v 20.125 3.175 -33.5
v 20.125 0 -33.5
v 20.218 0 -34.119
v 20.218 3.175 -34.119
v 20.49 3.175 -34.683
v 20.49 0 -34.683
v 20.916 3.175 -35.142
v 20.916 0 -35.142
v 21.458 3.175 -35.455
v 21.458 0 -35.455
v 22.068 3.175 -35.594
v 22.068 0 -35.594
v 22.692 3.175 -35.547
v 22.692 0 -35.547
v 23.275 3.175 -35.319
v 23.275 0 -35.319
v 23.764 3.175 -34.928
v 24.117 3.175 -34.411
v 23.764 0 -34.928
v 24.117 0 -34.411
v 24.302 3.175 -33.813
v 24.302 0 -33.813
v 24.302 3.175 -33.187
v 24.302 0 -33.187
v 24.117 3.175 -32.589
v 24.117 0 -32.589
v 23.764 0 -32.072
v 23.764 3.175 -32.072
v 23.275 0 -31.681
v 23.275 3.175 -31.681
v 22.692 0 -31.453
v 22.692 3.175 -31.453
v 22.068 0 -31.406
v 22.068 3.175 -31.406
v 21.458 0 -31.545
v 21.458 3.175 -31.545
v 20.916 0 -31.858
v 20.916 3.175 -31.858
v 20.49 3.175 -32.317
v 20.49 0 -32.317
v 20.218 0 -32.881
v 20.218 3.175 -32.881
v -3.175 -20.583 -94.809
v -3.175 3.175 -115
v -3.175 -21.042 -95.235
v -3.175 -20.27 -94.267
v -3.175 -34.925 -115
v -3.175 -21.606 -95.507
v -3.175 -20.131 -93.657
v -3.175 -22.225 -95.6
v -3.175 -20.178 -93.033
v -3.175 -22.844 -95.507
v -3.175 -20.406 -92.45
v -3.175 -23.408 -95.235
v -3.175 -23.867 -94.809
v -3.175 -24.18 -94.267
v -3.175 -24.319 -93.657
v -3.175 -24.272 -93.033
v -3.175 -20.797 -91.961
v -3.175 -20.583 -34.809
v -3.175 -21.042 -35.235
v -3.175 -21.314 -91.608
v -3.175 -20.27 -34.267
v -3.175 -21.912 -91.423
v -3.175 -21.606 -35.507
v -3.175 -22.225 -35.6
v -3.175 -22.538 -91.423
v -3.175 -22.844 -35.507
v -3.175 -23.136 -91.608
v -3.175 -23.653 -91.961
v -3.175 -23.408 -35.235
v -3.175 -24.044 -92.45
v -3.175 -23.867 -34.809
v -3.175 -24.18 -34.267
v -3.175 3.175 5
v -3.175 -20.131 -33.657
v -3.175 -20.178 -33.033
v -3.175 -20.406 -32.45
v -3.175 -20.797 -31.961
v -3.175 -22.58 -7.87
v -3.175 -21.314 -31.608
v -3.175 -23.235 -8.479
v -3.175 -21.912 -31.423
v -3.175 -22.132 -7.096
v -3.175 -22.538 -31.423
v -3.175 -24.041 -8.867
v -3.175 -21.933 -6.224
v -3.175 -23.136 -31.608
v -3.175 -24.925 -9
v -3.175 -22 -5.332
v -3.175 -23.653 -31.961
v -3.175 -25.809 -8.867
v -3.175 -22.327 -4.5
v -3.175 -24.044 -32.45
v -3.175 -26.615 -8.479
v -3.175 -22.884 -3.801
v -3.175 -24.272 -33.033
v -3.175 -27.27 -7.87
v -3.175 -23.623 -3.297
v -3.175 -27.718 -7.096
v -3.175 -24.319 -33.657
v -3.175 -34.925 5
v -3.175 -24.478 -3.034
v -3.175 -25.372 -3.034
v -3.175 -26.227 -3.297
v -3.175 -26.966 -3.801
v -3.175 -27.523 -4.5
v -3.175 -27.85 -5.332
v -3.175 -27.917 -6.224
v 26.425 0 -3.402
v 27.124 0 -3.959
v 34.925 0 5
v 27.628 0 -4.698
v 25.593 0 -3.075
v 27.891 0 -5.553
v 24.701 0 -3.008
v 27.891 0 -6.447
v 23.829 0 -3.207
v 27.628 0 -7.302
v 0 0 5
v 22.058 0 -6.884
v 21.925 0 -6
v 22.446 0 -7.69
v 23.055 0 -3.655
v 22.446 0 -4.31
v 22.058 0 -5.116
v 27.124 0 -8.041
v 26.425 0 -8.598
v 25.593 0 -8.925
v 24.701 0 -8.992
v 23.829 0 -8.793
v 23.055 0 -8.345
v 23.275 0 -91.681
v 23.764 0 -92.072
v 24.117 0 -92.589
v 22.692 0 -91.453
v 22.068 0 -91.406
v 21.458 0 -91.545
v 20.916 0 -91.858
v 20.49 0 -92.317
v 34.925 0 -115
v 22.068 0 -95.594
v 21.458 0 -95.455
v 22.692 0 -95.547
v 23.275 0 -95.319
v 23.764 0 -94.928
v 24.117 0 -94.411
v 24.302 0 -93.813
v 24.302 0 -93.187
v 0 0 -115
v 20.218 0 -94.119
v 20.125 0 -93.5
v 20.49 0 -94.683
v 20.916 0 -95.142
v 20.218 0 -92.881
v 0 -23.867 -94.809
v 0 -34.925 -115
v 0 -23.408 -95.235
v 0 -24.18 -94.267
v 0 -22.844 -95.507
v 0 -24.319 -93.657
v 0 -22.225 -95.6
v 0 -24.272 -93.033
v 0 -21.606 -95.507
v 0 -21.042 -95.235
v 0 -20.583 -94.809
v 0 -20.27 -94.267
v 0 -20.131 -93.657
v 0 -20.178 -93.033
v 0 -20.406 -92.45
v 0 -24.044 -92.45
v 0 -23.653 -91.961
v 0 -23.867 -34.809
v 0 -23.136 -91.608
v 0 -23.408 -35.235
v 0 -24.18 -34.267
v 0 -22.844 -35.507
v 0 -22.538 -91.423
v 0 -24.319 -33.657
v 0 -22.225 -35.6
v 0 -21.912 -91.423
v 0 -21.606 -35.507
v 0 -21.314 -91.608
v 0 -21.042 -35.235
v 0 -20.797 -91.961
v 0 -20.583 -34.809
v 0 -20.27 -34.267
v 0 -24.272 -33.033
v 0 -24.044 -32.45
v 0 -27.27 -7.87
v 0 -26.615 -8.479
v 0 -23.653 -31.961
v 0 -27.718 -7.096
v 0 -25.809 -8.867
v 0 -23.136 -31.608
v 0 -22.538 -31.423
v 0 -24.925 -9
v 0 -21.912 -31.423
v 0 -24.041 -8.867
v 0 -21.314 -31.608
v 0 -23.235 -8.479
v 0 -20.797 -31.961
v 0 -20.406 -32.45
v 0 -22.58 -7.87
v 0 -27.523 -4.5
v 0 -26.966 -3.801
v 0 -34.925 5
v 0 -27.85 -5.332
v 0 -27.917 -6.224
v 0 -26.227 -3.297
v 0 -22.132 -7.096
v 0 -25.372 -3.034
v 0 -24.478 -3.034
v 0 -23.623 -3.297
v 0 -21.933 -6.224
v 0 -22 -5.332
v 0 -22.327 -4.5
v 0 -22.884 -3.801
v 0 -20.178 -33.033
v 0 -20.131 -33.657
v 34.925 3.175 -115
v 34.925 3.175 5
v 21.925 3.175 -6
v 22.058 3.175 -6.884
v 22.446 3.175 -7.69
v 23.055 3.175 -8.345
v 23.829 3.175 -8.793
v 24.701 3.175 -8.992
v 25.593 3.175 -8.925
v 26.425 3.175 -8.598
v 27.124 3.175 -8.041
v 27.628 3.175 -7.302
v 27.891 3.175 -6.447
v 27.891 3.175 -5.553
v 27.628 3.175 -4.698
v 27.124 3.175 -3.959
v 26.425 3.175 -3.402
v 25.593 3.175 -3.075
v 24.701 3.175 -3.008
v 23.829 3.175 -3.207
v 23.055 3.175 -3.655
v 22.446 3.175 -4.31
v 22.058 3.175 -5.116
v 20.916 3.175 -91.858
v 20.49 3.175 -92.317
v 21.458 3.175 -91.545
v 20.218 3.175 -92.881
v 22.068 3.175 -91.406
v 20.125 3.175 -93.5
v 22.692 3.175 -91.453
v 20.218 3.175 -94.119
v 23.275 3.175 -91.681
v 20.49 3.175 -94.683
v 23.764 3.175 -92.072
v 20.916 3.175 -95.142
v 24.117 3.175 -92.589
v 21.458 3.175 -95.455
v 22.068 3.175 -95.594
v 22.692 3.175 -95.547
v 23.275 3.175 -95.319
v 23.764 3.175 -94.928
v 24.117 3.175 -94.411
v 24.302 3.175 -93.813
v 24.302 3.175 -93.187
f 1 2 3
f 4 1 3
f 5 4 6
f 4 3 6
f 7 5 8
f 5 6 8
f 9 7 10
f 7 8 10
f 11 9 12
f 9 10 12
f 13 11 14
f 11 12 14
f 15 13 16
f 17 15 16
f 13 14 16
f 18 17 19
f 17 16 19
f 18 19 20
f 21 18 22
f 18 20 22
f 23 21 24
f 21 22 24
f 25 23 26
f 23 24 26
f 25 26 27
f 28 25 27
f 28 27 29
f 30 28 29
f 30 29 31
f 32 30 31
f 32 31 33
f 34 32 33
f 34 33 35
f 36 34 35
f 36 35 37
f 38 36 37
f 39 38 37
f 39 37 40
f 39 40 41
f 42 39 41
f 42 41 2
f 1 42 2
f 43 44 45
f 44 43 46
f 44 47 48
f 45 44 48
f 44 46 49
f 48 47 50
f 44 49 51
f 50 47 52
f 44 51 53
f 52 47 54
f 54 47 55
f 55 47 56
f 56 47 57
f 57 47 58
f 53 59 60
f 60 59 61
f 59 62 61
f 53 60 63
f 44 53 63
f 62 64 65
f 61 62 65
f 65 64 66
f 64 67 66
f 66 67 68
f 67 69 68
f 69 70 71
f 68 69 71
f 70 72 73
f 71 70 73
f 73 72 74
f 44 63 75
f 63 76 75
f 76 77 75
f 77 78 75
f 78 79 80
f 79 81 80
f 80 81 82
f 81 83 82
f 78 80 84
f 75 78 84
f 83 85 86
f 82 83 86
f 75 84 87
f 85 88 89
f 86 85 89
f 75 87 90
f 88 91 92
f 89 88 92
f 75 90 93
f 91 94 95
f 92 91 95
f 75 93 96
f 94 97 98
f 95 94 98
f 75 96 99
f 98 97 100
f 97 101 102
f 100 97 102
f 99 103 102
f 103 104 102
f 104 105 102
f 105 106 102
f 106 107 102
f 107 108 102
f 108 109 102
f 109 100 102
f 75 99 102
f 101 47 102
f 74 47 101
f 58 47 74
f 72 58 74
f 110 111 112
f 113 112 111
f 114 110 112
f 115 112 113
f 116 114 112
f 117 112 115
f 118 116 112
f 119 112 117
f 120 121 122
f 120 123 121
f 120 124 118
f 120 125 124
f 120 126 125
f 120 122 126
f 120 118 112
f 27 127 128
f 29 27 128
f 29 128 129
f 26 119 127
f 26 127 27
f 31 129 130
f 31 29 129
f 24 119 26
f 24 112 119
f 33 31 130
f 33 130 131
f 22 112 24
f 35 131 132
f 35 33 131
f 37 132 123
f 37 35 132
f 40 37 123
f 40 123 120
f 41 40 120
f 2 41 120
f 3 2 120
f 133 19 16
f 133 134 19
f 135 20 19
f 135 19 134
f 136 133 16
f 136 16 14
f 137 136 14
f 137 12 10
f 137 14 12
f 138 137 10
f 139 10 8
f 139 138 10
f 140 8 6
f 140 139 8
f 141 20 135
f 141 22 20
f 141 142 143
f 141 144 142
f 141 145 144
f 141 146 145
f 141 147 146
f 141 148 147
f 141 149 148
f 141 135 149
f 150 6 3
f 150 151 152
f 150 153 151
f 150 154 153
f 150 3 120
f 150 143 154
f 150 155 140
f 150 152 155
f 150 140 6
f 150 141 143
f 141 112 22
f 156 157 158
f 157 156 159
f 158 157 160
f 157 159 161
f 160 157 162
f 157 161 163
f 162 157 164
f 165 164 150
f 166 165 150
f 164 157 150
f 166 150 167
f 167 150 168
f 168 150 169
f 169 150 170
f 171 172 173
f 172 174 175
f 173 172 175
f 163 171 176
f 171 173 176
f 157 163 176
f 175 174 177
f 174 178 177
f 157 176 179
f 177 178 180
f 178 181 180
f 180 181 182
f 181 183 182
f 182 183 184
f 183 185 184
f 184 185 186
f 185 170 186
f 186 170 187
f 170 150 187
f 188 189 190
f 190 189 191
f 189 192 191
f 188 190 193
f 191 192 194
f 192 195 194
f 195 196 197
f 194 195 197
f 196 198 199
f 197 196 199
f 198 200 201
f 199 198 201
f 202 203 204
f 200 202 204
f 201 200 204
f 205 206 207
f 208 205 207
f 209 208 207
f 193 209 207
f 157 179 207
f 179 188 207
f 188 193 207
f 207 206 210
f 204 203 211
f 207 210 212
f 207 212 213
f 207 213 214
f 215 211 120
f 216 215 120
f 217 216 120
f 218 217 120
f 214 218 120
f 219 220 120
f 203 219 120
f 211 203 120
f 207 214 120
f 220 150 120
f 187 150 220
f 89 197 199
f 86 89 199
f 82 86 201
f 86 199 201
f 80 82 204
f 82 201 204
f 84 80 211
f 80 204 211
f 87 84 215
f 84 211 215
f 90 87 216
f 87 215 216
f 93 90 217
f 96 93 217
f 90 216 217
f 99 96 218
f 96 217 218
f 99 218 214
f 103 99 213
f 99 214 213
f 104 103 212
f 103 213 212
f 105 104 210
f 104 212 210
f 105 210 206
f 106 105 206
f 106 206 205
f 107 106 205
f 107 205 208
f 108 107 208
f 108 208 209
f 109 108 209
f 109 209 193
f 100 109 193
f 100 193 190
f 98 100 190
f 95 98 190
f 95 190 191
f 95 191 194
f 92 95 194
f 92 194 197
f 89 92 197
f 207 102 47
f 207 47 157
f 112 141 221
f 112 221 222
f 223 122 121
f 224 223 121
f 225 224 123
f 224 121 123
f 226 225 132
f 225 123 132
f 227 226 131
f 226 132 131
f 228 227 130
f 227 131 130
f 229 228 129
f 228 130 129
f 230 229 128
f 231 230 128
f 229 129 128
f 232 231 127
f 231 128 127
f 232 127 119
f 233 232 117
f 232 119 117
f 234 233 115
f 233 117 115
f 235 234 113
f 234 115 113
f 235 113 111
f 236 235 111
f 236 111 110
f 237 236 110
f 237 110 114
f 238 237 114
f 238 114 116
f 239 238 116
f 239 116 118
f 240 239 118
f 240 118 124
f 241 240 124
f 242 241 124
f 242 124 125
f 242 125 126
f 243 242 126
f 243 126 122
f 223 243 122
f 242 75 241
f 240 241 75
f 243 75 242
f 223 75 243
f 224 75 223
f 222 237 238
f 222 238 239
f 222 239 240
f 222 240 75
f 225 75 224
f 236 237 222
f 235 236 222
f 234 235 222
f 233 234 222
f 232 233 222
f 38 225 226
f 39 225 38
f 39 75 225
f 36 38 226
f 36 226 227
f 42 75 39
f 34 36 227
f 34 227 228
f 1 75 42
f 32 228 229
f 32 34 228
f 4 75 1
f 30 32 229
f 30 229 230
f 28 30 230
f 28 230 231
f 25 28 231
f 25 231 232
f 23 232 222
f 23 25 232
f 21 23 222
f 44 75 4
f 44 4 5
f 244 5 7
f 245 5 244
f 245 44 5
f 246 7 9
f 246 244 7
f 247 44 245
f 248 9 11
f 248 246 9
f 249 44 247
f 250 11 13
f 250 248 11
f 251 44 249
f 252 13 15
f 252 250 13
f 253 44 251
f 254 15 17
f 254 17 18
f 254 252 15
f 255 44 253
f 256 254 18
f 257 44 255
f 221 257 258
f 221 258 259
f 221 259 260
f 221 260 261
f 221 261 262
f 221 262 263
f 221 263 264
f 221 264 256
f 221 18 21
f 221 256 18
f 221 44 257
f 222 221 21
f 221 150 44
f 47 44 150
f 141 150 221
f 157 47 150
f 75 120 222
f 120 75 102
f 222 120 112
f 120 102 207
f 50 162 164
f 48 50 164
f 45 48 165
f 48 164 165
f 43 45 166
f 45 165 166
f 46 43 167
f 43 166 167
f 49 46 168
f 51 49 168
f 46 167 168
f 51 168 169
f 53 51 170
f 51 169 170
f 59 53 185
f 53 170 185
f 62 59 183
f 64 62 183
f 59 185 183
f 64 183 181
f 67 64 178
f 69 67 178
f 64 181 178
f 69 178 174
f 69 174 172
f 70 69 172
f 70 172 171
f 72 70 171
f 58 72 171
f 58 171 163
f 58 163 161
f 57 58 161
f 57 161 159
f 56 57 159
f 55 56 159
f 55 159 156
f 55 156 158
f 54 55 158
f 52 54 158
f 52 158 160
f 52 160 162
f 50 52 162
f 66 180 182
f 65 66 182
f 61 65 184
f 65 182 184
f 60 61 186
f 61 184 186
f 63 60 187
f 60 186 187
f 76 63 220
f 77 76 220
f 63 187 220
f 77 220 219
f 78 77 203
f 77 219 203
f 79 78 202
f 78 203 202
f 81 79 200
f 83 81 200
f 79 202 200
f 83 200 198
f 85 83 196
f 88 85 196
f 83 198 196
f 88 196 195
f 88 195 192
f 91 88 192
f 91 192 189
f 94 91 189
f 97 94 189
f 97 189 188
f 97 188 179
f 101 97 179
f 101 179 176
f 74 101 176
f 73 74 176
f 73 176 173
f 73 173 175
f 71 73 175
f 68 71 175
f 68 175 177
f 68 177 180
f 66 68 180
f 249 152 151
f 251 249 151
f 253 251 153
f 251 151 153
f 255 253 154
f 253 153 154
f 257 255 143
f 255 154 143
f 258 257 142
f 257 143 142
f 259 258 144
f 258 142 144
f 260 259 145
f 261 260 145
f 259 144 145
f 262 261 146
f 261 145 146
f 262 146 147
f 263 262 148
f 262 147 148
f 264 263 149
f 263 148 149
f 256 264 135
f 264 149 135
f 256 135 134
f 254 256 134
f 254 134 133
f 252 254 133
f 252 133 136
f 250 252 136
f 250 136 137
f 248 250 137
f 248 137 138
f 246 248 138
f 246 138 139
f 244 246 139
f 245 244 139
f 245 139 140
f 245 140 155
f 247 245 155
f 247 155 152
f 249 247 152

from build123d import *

# Parameters (mm, degrees)
SKETCH1_W                      = 38.1
SKETCH1_H                      = 120
BOSS_EXTRUDE1_DEPTH            = 38.1
SKETCH2_W                      = 34.925
SKETCH2_H                      = 34.925
CUT_EXTRUDE1_DEPTH             = 130.767142413
F_4_2_4_2_DIAMETER_HOLE1_D     = 4.2
F_6_0_6_DIAMETER_HOLE1_D       = 6
F_4_2_4_2_DIAMETER_HOLE2_D     = 4.2
F_4_2_4_2_DIAMETER_HOLE2_DEPTH = 38.1
F_6_0_6_DIAMETER_HOLE2_D       = 6
F_6_0_6_DIAMETER_HOLE2_DEPTH   = 38.1
F_6_0_6_DIAMETER_HOLE3_D       = 6
F_6_0_6_DIAMETER_HOLE3_DEPTH   = 38.1
F_4_2_4_2_DIAMETER_HOLE3_D     = 4.2
SKETCH15_R                     = 2.1
SKETCH15_R_2                   = 3
BOSS_EXTRUDE2_DEPTH            = 3.175
BOSS_EXTRUDE3_START            = -3.175
SKETCH16_R                     = 3
SKETCH16_R_2                   = 2.1
BOSS_EXTRUDE3_DEPTH            = 3.175


with BuildPart() as part:
    # Sketch1 → Boss-Extrude1 (new body)
    with BuildSketch(Plane.XZ.offset(34.925)):
        with Locations((15.875, -55)):
            Rectangle(SKETCH1_W, SKETCH1_H)
    extrude(amount=-BOSS_EXTRUDE1_DEPTH)

    # Sketch2 → Cut-Extrude1 (cut, through all)
    with BuildSketch(Plane(origin=(0, 0, -115), x_dir=(-1, 0, 0), z_dir=(0, 0, -1))):
        with Locations((-17.4625, -17.4625)):
            Rectangle(SKETCH2_W, SKETCH2_H)
    extrude(amount=-CUT_EXTRUDE1_DEPTH, mode=Mode.SUBTRACT)

    # Ø4.2 (4.2) Diameter Hole1 (through all)
    with Locations(Plane(origin=(0, 0, 0), x_dir=(-1, 0, 0), z_dir=(0, -1, 0))):
        with Locations((-5, 35.97), (-5, 91.03)):
            Hole(F_4_2_4_2_DIAMETER_HOLE1_D / 2)

    # Ø6.0 (6) Diameter Hole1 (through all)
    with Locations(Plane(origin=(0, 0, 0), x_dir=(-1, 0, 0), z_dir=(0, -1, 0))):
        with Locations((-22.225, 106.5), (-22.225, 46.5)):
            Hole(F_6_0_6_DIAMETER_HOLE1_D / 2)

    # Ø4.2 (4.2) Diameter Hole2
    with Locations(Plane(origin=(0, 3.175, 0), x_dir=(1, 0, 0), z_dir=(0, 1, 0))):
        with Locations((22.225, 33.5), (22.225, 93.5), (29.296067812, 100.571067812), (29.296067812, 26.428932188)):
            Hole(F_4_2_4_2_DIAMETER_HOLE2_D / 2, depth=F_4_2_4_2_DIAMETER_HOLE2_DEPTH)

    # Ø6.0 (6) Diameter Hole2
    with Locations(Plane(origin=(0, 3.175, 0), x_dir=(1, 0, 0), z_dir=(0, 1, 0))):
        with Locations((24.925, 6)):
            Hole(F_6_0_6_DIAMETER_HOLE2_D / 2, depth=F_6_0_6_DIAMETER_HOLE2_DEPTH)

    # Ø6.0 (6) Diameter Hole3
    with Locations(Plane.ZY.offset(3.175)):
        with Locations((-6, -24.925), (-106.5, -22.225), (-46.5, -22.225)):
            Hole(F_6_0_6_DIAMETER_HOLE3_D / 2, depth=F_6_0_6_DIAMETER_HOLE3_DEPTH)

    # Ø4.2 (4.2) Diameter Hole3 (through all)
    with Locations(Plane.ZY.offset(3.175)):
        with Locations((-93.5, -22.225), (-33.5, -22.225), (-35.97, -5), (-91.03, -5), (-100.571067812, -29.296067812), (-26.428932188, -29.296067812)):
            Hole(F_4_2_4_2_DIAMETER_HOLE3_D / 2)

    # Sketch15 → Boss-Extrude2 (add)
    with BuildSketch(Plane(origin=(0, 3.175, 0), x_dir=(1, 0, 0), z_dir=(0, 1, 0))):
        with Locations((29.296067812, 26.428932188)):
            Circle(SKETCH15_R)
        with Locations((29.296067812, 100.571067812)):
            Circle(SKETCH15_R)
        with Locations((22.225, 106.5)):
            Circle(SKETCH15_R_2)
        with Locations((22.225, 46.5)):
            Circle(SKETCH15_R_2)
        with Locations((5, 35.97)):
            Circle(SKETCH15_R)
        with Locations((5, 91.03)):
            Circle(SKETCH15_R)
    extrude(amount=-BOSS_EXTRUDE2_DEPTH)

    # Sketch16 → Boss-Extrude3 (add)
    with BuildSketch(Plane.ZY.offset(3.175).offset(BOSS_EXTRUDE3_START)):
        with Locations((-106.5, -22.225)):
            Circle(SKETCH16_R)
        with Locations((-100.571067812, -29.296067812)):
            Circle(SKETCH16_R_2)
        with Locations((-46.5, -22.225)):
            Circle(SKETCH16_R)
        with Locations((-26.428932188, -29.296067812)):
            Circle(SKETCH16_R_2)
        with Locations((-35.97, -5)):
            Circle(SKETCH16_R_2)
        with Locations((-91.03, -5)):
            Circle(SKETCH16_R_2)
    extrude(amount=BOSS_EXTRUDE3_DEPTH)


solid = part.part
